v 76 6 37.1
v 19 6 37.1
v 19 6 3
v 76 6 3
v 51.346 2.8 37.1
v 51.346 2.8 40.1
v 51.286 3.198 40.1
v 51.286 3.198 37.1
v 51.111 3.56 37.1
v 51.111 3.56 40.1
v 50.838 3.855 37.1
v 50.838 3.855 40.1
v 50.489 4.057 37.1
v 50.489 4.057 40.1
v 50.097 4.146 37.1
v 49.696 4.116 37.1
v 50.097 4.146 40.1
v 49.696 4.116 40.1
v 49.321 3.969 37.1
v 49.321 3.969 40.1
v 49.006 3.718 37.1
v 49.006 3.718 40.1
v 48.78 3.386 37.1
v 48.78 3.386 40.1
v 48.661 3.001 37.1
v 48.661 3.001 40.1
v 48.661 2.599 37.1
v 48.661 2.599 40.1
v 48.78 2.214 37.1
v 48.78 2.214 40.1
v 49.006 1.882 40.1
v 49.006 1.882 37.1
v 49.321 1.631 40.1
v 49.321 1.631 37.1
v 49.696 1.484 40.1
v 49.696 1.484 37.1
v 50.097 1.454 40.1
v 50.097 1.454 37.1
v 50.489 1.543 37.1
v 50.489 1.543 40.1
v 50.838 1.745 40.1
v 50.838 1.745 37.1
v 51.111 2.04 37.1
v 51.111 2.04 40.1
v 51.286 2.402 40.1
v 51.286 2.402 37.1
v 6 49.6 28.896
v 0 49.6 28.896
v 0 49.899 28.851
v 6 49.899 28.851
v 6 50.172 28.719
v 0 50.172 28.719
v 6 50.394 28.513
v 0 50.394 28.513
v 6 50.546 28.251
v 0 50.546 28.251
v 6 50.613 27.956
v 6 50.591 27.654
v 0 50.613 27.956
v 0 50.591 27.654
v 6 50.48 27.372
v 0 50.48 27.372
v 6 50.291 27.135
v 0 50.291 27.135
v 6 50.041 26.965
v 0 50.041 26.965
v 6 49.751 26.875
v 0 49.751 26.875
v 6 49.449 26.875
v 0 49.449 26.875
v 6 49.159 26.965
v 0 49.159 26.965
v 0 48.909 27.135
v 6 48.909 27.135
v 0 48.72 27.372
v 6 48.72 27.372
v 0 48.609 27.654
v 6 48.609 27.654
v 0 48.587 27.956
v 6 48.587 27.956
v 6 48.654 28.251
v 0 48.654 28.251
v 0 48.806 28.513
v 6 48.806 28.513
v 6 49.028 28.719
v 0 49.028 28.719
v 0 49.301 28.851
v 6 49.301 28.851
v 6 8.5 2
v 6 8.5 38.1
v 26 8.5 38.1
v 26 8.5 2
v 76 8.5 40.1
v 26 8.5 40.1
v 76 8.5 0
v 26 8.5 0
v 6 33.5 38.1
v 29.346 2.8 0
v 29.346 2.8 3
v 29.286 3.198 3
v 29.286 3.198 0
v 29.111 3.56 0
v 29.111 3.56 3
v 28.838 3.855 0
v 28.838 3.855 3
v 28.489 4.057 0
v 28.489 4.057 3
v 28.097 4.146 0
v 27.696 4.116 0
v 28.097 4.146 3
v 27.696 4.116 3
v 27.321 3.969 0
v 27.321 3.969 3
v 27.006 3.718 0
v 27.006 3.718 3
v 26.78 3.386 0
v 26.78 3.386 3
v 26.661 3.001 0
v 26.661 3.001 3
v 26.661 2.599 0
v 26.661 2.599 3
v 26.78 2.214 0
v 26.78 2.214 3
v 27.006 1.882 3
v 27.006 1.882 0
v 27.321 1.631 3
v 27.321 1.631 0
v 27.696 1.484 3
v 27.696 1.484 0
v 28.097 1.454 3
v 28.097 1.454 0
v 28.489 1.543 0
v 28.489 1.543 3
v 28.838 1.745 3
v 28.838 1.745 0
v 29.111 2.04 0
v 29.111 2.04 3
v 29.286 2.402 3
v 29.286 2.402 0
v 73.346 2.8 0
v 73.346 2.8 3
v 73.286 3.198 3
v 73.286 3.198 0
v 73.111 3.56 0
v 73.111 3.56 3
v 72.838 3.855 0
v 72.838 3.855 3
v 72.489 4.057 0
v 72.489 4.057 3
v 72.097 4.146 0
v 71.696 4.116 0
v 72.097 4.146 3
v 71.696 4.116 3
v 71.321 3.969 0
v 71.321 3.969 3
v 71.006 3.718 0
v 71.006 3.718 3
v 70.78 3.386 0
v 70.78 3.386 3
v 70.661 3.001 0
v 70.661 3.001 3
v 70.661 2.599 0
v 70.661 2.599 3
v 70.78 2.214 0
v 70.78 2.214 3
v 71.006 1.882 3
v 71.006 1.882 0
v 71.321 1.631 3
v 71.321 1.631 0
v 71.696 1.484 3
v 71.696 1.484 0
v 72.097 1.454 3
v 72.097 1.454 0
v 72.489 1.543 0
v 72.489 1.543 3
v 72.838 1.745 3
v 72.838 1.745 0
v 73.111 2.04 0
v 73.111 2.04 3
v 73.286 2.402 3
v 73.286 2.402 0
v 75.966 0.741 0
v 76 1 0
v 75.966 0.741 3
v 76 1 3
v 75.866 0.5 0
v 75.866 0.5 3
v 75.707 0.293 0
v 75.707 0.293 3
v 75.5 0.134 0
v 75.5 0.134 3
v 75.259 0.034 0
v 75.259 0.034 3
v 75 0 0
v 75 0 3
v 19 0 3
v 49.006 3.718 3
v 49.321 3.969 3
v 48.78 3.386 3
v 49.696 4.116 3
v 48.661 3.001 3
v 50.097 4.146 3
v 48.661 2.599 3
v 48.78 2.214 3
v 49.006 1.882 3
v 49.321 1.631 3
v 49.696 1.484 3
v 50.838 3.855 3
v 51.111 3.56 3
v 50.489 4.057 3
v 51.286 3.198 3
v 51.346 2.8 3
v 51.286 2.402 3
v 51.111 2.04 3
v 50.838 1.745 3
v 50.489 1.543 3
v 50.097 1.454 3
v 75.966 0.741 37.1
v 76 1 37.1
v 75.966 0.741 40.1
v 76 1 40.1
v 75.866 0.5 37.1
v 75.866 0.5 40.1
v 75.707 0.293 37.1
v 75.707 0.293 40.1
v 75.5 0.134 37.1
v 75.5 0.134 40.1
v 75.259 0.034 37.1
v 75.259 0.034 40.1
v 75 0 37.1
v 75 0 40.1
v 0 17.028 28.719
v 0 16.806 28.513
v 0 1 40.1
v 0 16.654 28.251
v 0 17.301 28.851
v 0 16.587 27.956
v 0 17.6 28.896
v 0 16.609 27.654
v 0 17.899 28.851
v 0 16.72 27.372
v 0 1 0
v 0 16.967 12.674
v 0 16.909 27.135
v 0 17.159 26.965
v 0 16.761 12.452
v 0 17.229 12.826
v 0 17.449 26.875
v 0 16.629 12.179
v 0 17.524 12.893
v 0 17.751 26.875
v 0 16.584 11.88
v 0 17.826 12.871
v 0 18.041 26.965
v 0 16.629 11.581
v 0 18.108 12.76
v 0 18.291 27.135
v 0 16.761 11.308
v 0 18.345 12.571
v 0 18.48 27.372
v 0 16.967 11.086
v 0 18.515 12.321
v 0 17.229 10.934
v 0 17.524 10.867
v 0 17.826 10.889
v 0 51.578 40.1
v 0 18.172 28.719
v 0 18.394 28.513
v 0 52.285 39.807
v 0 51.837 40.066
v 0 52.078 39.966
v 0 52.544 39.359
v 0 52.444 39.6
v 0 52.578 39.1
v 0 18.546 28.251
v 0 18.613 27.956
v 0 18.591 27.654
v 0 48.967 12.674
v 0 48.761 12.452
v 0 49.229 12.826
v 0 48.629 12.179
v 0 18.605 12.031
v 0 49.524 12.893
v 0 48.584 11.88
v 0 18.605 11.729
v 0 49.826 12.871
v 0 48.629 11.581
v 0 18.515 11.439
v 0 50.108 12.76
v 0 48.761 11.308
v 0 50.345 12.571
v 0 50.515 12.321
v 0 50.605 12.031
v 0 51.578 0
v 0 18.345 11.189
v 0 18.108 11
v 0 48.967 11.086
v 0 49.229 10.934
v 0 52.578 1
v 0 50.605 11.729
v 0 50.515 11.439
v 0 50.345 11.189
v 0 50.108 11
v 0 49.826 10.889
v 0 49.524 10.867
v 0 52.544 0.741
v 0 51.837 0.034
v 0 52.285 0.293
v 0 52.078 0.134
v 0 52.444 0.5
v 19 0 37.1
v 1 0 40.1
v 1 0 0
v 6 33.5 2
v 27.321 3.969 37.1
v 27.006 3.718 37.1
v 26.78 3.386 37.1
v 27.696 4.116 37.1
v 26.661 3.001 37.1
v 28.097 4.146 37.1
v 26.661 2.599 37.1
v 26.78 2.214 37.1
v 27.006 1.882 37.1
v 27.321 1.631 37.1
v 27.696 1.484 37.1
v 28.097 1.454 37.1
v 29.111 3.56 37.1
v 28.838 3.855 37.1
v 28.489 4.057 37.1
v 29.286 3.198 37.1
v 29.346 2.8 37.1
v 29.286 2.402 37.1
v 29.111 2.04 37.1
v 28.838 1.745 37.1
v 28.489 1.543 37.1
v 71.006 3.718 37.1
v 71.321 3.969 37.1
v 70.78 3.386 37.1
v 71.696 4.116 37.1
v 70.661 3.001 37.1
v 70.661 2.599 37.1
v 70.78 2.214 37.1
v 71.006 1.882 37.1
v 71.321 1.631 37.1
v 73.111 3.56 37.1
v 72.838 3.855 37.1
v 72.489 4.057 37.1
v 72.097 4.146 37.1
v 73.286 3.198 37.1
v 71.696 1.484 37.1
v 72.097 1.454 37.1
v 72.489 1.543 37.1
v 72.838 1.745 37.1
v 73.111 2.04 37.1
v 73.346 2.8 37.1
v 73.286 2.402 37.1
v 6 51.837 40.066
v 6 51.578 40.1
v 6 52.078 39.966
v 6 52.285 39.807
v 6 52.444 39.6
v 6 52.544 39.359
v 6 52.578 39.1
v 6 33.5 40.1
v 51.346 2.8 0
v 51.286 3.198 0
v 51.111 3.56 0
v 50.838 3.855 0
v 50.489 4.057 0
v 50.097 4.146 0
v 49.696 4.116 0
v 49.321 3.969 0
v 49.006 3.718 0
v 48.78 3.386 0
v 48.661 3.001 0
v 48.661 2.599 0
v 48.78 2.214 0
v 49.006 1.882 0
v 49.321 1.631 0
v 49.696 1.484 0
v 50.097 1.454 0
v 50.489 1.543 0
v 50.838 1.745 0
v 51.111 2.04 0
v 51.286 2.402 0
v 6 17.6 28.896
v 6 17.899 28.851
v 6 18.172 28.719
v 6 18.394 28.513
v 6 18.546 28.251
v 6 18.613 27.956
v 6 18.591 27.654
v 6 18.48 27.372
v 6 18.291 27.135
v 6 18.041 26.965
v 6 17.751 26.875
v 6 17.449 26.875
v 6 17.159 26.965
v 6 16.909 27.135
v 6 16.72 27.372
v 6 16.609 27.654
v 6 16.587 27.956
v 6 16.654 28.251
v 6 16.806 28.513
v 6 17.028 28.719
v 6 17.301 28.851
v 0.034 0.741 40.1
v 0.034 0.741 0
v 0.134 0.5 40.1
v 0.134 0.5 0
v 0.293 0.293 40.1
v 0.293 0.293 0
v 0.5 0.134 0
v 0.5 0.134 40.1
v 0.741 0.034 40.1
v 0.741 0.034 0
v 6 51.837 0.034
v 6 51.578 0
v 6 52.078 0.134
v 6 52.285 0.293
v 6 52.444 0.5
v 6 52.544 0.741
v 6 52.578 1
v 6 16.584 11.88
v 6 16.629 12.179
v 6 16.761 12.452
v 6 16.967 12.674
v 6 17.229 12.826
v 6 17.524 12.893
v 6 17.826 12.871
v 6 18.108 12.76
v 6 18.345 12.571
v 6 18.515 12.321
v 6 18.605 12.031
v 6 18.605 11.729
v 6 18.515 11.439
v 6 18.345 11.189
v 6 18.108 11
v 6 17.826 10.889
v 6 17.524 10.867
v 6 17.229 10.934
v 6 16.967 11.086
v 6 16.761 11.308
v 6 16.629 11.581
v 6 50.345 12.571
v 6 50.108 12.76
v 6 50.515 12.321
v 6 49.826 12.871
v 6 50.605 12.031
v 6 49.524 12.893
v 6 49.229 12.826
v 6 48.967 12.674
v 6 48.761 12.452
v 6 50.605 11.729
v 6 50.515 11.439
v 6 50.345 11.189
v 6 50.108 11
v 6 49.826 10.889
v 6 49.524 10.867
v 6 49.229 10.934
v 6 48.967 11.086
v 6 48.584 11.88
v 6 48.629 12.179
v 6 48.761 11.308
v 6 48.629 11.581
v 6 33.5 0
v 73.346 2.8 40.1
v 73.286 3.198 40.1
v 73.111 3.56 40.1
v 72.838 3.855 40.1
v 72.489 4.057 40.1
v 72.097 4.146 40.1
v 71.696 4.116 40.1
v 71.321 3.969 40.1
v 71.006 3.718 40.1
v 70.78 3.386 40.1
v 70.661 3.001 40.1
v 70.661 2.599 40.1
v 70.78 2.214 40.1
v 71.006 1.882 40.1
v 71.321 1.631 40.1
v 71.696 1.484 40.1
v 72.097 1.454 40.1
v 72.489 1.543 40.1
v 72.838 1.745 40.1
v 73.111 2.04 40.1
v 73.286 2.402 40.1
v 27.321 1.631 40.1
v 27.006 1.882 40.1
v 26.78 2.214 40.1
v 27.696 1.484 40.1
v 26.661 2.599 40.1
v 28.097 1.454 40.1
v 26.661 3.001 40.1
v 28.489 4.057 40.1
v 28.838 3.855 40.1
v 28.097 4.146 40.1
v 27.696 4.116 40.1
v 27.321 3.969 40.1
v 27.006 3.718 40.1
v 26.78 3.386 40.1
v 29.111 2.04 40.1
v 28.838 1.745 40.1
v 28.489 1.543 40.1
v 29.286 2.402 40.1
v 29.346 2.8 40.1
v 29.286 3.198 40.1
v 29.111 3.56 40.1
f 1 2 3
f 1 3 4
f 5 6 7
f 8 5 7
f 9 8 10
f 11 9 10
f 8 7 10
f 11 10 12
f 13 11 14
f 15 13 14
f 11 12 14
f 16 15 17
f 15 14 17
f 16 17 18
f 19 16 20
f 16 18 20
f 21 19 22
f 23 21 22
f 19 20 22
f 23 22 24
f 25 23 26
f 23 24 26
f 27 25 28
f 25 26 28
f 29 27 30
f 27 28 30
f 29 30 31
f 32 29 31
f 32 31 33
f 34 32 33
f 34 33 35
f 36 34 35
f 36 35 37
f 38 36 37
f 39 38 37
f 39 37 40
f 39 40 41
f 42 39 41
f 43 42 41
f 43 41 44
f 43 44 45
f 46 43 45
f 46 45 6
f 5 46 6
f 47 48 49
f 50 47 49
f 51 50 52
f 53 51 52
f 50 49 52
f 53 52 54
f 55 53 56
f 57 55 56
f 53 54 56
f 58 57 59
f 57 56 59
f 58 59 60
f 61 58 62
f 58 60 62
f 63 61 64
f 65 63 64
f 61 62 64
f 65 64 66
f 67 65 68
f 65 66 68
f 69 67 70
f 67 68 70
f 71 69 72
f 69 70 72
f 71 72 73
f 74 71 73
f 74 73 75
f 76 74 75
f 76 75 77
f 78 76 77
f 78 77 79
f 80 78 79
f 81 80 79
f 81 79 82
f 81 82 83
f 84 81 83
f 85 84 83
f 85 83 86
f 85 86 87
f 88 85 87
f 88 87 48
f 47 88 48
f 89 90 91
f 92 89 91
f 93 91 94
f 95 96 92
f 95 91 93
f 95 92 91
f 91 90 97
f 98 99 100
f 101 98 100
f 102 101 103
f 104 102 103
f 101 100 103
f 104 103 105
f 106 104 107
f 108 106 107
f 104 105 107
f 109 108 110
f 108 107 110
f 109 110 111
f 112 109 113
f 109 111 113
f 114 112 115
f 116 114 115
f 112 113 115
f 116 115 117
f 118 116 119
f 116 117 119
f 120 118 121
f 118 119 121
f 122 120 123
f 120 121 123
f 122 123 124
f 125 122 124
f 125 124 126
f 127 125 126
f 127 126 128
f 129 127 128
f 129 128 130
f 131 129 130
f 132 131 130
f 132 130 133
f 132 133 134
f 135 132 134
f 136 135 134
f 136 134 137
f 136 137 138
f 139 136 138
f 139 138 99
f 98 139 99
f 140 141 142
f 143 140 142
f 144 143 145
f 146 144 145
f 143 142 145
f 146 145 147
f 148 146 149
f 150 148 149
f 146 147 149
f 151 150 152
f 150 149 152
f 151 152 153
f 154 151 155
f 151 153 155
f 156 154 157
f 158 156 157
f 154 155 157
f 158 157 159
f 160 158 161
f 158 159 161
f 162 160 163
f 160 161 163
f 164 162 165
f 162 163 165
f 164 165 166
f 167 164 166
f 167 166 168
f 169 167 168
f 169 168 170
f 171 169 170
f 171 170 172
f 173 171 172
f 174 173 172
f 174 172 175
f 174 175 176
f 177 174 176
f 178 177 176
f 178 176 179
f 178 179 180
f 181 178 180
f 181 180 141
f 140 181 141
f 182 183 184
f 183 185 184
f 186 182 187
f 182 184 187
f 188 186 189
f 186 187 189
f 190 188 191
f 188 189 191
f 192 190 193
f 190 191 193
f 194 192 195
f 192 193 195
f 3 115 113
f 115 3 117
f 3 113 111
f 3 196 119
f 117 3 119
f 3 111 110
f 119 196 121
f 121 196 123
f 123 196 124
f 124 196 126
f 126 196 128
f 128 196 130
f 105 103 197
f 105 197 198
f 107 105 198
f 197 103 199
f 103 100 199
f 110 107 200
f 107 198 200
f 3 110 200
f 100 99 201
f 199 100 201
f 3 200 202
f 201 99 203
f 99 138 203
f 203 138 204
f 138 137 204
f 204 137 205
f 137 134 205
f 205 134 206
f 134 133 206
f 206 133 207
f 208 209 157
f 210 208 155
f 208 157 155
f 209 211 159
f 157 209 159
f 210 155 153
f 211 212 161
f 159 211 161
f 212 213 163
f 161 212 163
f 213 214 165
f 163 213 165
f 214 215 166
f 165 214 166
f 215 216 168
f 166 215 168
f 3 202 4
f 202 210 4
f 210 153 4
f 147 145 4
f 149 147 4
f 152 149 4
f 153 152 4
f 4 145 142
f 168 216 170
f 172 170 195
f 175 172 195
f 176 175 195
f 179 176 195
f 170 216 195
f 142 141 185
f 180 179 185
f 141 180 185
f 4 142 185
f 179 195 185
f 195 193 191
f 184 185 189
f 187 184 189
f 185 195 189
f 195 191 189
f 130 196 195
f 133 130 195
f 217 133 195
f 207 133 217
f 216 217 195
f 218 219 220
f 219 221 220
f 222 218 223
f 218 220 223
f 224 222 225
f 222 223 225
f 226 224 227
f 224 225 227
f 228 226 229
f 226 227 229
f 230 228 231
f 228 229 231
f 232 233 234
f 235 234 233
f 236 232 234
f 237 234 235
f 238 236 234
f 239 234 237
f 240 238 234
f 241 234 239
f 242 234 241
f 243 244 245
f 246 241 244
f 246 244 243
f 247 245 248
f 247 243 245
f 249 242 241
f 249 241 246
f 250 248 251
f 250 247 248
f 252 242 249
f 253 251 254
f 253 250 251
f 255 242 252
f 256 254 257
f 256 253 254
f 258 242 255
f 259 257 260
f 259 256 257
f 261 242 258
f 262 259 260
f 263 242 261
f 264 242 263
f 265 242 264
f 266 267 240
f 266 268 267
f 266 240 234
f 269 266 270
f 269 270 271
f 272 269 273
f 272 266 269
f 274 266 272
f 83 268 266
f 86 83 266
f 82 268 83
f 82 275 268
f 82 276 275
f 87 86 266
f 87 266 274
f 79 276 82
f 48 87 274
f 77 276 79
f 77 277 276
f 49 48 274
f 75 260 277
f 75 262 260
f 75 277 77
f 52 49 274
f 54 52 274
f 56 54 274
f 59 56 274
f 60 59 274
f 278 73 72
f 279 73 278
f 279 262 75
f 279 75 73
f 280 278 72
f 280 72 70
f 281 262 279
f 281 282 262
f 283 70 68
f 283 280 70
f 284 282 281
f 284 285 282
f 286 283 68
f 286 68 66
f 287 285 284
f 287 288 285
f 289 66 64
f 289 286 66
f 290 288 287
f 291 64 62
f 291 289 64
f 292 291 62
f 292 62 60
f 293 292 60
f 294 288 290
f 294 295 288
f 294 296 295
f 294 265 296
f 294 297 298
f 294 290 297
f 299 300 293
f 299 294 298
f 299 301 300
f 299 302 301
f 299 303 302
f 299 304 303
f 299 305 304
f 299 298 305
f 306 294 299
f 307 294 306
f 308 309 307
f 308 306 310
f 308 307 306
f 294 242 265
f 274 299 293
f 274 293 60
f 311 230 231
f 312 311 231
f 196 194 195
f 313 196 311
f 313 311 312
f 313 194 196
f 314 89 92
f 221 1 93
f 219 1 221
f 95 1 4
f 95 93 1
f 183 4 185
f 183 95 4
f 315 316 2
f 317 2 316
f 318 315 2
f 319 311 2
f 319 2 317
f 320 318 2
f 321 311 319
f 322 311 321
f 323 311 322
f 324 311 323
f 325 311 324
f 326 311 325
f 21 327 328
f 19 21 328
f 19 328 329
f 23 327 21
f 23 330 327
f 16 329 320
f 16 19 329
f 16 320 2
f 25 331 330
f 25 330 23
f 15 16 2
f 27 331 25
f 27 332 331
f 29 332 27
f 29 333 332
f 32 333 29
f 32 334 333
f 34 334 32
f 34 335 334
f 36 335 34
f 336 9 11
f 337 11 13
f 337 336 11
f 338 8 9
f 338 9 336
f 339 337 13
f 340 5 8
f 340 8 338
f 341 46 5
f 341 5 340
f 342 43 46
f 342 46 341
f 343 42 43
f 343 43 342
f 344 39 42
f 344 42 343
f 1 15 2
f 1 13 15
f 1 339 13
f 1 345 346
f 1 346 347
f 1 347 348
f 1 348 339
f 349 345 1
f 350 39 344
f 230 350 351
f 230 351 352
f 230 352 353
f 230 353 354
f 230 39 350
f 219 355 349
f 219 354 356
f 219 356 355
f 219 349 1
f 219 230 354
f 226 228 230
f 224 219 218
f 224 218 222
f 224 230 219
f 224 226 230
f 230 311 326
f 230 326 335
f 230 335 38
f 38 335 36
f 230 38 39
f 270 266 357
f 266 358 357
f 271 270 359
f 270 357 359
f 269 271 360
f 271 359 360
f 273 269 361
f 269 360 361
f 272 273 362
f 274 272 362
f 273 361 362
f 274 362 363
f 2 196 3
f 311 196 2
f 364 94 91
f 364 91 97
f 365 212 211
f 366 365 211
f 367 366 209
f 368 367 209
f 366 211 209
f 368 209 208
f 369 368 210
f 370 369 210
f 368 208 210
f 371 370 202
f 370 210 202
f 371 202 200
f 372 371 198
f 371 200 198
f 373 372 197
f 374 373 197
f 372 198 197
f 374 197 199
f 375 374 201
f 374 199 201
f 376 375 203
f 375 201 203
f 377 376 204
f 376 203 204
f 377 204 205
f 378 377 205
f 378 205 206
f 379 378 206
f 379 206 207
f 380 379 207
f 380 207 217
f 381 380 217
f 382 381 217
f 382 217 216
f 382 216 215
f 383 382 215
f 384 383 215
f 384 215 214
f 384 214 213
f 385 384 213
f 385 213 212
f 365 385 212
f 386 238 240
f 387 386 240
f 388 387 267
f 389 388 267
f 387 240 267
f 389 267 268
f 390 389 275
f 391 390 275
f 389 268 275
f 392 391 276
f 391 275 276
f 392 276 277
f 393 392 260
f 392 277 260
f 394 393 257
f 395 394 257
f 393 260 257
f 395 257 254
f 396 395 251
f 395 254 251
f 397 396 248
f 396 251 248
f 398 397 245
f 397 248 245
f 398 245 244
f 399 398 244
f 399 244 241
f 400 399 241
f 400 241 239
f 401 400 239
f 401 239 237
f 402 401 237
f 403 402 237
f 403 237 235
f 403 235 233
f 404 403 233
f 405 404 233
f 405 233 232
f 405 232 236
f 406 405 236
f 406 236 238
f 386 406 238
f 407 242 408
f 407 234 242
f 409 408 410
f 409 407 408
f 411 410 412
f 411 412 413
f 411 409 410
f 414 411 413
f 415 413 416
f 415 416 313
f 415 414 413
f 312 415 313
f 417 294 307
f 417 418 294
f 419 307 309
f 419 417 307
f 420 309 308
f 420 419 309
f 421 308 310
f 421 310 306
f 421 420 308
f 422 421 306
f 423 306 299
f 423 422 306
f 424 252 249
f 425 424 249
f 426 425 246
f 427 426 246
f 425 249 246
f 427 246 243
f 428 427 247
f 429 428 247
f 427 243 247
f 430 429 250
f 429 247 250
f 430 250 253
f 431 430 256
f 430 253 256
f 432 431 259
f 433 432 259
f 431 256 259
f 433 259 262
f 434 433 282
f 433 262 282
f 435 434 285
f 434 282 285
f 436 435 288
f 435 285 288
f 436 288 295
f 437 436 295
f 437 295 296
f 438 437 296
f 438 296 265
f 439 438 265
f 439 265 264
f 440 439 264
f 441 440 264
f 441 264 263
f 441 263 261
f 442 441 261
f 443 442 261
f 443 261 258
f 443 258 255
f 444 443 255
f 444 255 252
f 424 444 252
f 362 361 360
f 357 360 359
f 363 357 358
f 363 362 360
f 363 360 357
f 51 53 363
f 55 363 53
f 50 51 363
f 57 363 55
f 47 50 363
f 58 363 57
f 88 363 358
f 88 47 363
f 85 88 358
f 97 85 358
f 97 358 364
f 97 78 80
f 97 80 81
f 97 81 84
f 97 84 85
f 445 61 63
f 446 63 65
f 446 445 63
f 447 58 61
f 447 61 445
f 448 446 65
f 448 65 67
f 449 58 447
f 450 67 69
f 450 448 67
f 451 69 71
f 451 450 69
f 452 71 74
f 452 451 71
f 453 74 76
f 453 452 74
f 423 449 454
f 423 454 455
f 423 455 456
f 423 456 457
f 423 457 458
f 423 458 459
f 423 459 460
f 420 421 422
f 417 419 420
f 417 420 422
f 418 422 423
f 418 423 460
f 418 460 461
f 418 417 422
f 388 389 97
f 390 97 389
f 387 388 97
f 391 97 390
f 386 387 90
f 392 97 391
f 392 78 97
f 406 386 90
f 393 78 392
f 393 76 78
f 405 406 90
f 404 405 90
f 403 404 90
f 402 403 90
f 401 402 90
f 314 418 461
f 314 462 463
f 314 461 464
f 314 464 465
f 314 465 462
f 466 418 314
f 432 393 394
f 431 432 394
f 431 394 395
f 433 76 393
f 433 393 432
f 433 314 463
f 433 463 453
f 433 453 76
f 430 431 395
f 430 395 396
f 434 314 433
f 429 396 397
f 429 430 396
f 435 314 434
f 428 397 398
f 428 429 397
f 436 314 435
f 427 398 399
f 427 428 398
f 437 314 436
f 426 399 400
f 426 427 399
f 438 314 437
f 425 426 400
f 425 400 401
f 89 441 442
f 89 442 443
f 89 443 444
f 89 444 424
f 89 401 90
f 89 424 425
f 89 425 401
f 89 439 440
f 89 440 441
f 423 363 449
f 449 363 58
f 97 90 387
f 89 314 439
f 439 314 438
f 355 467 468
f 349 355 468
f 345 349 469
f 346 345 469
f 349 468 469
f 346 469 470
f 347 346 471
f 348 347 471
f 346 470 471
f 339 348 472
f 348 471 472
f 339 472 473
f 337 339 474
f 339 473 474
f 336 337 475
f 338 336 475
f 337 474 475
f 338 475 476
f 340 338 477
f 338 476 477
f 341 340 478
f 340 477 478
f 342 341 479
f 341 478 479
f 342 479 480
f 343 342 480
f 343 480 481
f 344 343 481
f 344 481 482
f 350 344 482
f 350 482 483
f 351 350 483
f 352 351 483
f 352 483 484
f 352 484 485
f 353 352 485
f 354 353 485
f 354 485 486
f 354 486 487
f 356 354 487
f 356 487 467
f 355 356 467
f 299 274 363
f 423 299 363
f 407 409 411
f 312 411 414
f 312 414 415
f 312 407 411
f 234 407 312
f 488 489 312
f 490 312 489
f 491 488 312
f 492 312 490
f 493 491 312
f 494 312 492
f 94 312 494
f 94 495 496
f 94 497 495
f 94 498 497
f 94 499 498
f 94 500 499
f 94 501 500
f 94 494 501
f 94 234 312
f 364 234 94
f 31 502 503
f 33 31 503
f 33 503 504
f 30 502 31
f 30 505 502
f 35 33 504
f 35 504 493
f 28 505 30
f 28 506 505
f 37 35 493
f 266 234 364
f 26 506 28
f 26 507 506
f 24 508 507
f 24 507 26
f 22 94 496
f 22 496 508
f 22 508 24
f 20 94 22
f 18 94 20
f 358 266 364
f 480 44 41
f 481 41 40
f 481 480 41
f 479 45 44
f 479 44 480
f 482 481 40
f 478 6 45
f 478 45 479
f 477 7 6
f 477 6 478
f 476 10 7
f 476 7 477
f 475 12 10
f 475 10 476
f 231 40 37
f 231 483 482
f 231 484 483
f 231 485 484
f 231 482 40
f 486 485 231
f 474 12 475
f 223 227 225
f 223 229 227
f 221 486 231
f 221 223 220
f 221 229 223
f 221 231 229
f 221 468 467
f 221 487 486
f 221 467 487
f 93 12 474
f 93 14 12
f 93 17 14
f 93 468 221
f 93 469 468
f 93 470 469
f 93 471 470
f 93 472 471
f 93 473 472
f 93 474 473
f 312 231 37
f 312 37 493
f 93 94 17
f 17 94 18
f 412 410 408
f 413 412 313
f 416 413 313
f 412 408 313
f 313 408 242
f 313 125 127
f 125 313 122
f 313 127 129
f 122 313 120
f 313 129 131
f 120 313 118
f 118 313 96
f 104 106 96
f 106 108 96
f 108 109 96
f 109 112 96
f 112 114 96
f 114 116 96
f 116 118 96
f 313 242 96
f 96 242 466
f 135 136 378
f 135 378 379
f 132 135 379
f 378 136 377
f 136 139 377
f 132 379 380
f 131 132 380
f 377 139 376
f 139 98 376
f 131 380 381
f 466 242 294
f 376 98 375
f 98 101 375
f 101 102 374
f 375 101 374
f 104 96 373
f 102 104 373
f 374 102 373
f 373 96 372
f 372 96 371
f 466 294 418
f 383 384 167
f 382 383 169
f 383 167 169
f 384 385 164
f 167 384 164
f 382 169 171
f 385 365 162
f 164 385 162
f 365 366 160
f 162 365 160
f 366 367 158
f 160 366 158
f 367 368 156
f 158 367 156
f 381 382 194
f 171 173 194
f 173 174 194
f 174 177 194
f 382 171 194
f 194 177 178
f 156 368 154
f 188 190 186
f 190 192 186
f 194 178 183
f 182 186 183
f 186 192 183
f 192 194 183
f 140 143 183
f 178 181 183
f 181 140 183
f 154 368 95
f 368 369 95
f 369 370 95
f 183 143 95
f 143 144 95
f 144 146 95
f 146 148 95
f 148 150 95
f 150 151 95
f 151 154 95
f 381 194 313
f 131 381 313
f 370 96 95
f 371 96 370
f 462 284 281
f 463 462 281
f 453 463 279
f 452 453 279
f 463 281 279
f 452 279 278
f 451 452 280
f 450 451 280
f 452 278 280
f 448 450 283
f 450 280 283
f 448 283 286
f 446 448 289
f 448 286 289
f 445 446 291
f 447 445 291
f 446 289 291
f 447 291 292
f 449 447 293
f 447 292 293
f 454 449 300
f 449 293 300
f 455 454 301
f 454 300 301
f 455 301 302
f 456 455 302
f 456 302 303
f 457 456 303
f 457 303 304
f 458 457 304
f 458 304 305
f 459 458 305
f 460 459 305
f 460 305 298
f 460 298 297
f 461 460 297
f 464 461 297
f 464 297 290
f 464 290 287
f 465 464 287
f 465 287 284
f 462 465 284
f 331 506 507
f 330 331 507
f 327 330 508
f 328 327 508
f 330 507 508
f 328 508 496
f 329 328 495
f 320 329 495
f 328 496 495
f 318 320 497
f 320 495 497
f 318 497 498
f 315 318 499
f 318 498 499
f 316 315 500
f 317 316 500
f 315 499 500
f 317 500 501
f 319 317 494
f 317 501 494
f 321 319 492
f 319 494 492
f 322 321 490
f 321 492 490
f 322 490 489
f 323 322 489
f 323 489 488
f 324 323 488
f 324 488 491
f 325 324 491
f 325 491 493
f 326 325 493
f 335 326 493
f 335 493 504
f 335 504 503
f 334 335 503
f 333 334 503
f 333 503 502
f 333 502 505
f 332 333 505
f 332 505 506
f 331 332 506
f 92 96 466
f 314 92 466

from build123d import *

# Parameters (mm, degrees)
BOSS_EXTRUDE1_DEPTH = 40.1
SKETCH3_R           = 1.35
CUT_EXTRUDE2_DEPTH  = 50.8
SKETCH4_R           = 1.016
CUT_EXTRUDE3_DEPTH  = 50.8
SKETCH6_W           = 62.086073973
SKETCH6_H           = 34.1
CUT_EXTRUDE4_DEPTH  = 6
BOSS_EXTRUDE5_DEPTH = 2
FILLET1_R           = 1


with BuildPart() as part:
    # Sketch1 → Boss-Extrude1 (new body)
    with BuildSketch(Plane.XY):
        Polygon((0, 0), (0, 52.578), (6, 52.578), (6, 8.5), (76, 8.5), (76, 0), align=None)
    extrude(amount=BOSS_EXTRUDE1_DEPTH)

    # Sketch3 → Cut-Extrude2 (cut)
    with BuildSketch(Plane.XY.offset(40.1)):
        with Locations((27.996, 2.8)):
            Circle(SKETCH3_R)
        with Locations((49.996, 2.8)):
            Circle(SKETCH3_R)
        with Locations((71.996, 2.8)):
            Circle(SKETCH3_R)
    extrude(amount=-CUT_EXTRUDE2_DEPTH, mode=Mode.SUBTRACT)

    # Sketch4 → Cut-Extrude3 (cut)
    with BuildSketch(Plane.ZY):
        with Locations((27.88, 17.6)):
            Circle(SKETCH4_R)
        with Locations(Location((11.88, 17.6, 0), (0, 0, 270))):
            Circle(SKETCH4_R)
        with Locations((27.88, 49.6)):
            Circle(SKETCH4_R)
        with Locations(Location((11.88, 49.6, 0), (0, 0, 270))):
            Circle(SKETCH4_R)
    extrude(amount=-CUT_EXTRUDE3_DEPTH, mode=Mode.SUBTRACT)

    # Sketch6 → Cut-Extrude4 (cut)
    with BuildSketch(Plane.XZ):
        with Locations((50.043036987, 20.05)):
            Rectangle(SKETCH6_W, SKETCH6_H)
    extrude(amount=-CUT_EXTRUDE4_DEPTH, mode=Mode.SUBTRACT)

    # Sketch16 → Boss-Extrude5 (add)
    with BuildSketch(Plane.XY.offset(40.1)):
        Polygon((6, 8.5), (26, 8.5), (6, 33.5), align=None)
    boss_extrude5 = extrude(amount=-BOSS_EXTRUDE5_DEPTH)

    # Mirror2: Boss-Extrude5 across plane
    add(boss_extrude5.mirror(Plane(origin=(0, 0, 20.05), x_dir=(1, 0, 0), z_dir=(0, 0, -1))))

    # Fillet1
    fillet1_edges = [part.edges().sort_by_distance(p)[0] for p in [
        (0, 0, 20.05),
        (76, 0, 38.6),
        (3, 52.578, 40.1),
        (76, 0, 1.5),
        (3, 52.578, 0),
    ]]
    fillet(fillet1_edges, radius=FILLET1_R)


solid = part.part
